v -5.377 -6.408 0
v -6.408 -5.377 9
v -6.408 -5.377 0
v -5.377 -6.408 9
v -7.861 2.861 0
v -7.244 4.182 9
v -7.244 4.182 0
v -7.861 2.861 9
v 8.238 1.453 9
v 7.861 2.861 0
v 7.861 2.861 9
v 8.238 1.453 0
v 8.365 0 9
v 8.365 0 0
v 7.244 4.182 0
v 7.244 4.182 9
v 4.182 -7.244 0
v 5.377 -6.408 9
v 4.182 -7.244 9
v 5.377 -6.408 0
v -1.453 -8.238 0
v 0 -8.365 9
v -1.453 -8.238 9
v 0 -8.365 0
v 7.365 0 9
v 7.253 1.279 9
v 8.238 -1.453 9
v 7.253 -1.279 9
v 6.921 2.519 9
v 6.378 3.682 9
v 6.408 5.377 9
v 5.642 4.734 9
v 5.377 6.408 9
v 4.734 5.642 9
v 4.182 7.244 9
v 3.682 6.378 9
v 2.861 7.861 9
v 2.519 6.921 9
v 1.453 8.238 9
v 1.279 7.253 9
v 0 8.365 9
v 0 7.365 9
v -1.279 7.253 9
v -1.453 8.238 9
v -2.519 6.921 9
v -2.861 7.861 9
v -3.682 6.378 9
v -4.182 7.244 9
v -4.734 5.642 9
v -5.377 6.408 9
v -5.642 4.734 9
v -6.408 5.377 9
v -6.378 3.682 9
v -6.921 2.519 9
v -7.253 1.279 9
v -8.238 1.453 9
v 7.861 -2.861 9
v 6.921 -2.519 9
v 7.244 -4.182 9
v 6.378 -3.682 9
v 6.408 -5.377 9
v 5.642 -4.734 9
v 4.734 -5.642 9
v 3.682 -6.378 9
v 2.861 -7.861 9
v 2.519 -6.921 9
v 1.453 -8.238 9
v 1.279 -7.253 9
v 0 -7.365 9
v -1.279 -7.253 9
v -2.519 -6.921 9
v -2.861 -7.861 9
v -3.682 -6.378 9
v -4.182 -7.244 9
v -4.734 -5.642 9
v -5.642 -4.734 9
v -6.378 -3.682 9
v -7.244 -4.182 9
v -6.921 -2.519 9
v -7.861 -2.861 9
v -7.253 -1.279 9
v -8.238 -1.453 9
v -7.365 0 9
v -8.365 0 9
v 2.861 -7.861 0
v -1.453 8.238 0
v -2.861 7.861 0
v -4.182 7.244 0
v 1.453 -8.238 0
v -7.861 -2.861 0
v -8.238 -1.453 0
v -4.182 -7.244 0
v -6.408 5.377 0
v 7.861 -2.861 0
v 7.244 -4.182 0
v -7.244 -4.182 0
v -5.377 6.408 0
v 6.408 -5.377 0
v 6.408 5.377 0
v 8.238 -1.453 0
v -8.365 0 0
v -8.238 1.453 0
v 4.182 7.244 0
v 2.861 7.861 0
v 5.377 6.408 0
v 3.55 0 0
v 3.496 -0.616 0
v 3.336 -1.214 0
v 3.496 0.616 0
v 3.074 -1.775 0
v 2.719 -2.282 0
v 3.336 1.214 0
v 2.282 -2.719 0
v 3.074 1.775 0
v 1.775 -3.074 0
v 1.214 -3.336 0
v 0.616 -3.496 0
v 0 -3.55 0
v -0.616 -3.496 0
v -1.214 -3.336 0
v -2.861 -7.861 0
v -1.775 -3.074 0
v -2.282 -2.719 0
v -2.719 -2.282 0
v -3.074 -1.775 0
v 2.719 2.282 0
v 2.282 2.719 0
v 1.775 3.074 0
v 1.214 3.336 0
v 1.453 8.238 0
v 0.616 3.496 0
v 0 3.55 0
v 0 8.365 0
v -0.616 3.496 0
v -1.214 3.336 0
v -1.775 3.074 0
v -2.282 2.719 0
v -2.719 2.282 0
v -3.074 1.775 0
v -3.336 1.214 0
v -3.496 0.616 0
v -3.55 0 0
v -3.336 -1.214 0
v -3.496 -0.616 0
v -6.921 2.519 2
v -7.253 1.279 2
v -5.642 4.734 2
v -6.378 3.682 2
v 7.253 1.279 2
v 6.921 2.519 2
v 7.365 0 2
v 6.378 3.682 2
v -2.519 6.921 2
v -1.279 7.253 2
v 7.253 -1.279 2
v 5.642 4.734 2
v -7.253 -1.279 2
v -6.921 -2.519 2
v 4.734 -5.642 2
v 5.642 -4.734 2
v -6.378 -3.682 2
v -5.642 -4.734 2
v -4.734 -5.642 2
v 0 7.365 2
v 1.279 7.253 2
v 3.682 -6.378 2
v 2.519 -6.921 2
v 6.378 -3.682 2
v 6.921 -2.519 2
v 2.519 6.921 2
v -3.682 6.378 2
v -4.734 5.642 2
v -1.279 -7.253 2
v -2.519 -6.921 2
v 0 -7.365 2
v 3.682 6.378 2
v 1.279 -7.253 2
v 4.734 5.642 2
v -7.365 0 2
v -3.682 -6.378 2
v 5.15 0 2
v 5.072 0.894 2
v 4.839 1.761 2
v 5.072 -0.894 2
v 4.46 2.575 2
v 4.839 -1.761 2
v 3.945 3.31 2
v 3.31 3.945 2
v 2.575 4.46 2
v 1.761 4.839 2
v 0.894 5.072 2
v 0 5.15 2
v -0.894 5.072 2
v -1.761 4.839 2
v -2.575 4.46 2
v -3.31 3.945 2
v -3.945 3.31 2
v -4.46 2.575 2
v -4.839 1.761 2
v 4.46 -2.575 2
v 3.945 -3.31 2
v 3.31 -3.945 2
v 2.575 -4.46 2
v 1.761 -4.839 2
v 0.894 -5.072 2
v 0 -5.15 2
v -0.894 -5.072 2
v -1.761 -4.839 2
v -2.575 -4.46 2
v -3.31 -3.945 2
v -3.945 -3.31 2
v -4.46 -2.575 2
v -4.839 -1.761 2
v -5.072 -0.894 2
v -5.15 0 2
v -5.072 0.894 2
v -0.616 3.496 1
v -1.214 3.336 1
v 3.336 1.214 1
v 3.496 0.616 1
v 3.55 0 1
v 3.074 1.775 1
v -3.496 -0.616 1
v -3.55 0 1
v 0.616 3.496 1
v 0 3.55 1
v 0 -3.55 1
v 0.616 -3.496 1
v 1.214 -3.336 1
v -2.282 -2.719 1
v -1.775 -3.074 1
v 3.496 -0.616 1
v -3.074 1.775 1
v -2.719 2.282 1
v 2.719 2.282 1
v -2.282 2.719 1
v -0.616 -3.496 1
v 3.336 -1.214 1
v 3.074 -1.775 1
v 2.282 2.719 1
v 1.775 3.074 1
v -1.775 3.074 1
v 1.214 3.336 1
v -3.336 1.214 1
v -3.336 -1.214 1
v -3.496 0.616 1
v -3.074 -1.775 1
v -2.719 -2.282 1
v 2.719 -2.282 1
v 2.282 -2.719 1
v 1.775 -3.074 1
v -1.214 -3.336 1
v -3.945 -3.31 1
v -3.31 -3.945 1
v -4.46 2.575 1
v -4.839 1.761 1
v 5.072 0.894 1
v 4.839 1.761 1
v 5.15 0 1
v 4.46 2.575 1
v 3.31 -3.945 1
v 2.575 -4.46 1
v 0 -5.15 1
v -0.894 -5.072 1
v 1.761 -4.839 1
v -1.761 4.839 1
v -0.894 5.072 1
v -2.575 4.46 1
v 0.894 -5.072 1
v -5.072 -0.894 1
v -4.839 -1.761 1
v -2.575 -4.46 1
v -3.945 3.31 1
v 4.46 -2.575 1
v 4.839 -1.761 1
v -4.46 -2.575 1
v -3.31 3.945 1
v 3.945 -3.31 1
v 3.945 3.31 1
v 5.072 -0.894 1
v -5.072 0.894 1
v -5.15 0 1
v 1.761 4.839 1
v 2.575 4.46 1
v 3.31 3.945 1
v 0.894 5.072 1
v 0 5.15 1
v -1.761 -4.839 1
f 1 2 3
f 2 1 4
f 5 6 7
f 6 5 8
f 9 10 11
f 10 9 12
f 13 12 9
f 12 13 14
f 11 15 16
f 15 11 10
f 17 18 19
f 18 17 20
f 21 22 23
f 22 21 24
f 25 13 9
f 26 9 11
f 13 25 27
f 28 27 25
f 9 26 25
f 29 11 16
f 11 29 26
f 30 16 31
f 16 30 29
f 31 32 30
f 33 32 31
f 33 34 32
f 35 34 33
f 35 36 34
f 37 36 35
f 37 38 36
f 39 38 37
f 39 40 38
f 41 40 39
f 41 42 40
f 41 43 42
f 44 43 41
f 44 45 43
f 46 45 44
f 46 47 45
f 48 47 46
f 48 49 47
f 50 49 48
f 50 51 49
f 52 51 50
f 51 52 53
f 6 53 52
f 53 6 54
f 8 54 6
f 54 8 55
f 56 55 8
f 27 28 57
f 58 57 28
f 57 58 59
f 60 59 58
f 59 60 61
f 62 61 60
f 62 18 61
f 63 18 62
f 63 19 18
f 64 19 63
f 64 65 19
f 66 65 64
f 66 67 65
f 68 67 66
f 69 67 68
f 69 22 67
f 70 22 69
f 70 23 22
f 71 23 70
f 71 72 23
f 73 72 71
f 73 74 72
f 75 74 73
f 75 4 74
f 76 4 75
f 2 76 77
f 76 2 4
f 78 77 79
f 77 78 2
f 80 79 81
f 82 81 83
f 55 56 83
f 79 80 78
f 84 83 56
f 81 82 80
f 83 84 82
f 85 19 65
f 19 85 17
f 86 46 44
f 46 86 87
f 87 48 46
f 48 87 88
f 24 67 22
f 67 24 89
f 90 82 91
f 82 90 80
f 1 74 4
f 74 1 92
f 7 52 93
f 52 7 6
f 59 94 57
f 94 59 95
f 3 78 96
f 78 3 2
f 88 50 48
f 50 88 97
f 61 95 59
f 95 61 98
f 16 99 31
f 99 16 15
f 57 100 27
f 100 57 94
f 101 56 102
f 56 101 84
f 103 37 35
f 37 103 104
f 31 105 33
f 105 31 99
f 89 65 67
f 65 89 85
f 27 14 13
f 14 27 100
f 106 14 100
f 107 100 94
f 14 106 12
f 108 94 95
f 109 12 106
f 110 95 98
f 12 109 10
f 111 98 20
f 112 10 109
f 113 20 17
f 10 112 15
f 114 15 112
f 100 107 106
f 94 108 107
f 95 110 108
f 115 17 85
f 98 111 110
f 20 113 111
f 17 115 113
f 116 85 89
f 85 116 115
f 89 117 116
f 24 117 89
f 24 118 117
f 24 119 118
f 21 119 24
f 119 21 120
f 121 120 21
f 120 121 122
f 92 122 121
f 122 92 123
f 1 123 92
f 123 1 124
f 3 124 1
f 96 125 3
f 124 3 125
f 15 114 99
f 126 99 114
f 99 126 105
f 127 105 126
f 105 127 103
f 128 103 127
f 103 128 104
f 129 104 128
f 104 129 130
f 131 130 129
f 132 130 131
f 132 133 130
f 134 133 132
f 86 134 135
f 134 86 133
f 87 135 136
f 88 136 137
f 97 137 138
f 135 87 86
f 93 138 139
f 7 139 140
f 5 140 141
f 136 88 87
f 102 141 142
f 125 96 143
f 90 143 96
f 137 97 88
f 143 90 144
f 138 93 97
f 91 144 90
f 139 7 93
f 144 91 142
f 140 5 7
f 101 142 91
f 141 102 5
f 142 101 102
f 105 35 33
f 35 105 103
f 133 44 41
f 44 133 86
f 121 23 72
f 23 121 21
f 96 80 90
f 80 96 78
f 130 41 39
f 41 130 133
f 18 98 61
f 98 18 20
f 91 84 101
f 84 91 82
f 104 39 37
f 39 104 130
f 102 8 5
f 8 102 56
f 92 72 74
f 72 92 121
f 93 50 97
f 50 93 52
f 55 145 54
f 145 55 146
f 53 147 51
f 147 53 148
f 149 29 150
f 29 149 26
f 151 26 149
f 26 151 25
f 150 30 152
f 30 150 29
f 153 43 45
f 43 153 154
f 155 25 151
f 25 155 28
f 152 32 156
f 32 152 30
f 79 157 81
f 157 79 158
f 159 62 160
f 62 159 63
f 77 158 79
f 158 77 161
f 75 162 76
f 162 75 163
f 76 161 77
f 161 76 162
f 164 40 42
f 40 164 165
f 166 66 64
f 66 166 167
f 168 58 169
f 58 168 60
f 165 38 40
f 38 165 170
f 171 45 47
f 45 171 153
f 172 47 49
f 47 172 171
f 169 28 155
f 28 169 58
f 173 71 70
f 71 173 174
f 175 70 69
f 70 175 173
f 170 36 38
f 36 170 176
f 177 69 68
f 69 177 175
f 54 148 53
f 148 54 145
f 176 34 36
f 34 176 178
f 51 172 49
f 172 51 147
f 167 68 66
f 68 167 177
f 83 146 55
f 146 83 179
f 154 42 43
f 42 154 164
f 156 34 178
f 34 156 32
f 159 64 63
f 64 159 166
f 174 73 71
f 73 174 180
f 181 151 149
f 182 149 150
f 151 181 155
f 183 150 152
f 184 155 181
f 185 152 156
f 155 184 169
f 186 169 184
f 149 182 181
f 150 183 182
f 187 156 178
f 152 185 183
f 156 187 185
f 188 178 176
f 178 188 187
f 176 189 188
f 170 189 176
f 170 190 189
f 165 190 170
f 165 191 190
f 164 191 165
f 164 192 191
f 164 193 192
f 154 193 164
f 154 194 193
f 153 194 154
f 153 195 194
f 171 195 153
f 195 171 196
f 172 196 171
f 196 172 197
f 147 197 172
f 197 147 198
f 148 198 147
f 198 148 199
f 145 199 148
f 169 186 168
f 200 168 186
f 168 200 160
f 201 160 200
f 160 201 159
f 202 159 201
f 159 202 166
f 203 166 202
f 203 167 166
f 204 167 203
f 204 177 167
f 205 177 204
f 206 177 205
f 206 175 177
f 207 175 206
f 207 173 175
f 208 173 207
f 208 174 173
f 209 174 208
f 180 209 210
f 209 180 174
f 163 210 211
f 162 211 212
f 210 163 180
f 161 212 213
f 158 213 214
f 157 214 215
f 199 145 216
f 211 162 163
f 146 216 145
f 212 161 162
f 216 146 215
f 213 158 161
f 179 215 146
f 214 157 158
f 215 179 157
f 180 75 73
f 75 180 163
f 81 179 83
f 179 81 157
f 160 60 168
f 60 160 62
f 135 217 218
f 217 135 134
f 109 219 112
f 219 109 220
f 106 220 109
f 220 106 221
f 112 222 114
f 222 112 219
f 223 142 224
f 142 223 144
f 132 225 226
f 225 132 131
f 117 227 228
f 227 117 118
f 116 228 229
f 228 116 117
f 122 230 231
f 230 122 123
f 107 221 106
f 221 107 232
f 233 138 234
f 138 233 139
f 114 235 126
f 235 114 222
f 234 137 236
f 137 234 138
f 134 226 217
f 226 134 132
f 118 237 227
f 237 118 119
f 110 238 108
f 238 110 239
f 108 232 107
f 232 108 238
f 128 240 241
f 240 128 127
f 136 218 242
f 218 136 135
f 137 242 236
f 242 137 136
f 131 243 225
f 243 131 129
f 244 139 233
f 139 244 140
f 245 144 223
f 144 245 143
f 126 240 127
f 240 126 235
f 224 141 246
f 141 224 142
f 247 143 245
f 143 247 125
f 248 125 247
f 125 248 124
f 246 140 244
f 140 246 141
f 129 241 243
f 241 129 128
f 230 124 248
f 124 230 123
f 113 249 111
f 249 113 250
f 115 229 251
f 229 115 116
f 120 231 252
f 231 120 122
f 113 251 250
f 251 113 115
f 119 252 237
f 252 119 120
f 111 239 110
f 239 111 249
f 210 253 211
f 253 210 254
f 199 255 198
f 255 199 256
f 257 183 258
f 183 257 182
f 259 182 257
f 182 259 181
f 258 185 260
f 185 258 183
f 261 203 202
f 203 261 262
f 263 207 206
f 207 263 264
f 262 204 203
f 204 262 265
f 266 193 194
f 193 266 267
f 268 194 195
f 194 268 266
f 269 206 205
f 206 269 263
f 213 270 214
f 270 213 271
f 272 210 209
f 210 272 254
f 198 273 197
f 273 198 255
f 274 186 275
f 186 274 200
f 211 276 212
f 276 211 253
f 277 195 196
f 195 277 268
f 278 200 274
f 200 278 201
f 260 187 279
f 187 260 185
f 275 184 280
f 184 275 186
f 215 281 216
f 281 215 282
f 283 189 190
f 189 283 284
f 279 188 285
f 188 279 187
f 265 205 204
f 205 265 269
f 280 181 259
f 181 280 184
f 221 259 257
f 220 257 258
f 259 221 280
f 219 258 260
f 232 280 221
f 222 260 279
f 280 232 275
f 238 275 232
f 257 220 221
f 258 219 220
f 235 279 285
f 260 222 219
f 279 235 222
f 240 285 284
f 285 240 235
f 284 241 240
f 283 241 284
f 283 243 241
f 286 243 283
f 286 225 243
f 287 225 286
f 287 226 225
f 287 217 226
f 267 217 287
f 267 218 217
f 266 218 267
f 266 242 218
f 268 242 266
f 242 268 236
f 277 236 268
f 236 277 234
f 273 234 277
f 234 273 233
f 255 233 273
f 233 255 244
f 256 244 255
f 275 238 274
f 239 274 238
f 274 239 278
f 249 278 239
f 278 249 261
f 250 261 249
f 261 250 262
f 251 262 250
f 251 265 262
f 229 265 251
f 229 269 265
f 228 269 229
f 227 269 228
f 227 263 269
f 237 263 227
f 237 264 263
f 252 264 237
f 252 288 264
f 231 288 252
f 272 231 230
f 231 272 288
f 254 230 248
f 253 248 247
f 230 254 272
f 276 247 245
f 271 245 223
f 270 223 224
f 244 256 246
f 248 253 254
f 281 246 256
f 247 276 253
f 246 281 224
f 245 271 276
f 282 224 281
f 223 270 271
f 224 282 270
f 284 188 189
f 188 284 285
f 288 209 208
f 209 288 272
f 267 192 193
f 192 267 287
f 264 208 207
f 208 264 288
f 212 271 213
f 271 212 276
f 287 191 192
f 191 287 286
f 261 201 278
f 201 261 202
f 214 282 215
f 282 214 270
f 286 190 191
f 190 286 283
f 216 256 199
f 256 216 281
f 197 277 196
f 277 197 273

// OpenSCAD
filterDiameter = 9.7;
laserDiameter = 14.13;
thickness = 1;
holeDiameter = 6.5;
height = 9;
tolerance = 0.3;

module dummy(){}

$fn = 36;
nudge = 0.001;

difference() {
    cylinder(d=laserDiameter+2*thickness+2*tolerance,h=height);
    translate([0,0,thickness*2])
        cylinder(d=laserDiameter+2*tolerance,h=height);
    translate([0,0,-nudge])
    cylinder(d=holeDiameter+2*tolerance,h=height+nudge);
    translate([0,0,thickness])
    cylinder(d=filterDiameter+2*tolerance,h=height+nudge);
}
